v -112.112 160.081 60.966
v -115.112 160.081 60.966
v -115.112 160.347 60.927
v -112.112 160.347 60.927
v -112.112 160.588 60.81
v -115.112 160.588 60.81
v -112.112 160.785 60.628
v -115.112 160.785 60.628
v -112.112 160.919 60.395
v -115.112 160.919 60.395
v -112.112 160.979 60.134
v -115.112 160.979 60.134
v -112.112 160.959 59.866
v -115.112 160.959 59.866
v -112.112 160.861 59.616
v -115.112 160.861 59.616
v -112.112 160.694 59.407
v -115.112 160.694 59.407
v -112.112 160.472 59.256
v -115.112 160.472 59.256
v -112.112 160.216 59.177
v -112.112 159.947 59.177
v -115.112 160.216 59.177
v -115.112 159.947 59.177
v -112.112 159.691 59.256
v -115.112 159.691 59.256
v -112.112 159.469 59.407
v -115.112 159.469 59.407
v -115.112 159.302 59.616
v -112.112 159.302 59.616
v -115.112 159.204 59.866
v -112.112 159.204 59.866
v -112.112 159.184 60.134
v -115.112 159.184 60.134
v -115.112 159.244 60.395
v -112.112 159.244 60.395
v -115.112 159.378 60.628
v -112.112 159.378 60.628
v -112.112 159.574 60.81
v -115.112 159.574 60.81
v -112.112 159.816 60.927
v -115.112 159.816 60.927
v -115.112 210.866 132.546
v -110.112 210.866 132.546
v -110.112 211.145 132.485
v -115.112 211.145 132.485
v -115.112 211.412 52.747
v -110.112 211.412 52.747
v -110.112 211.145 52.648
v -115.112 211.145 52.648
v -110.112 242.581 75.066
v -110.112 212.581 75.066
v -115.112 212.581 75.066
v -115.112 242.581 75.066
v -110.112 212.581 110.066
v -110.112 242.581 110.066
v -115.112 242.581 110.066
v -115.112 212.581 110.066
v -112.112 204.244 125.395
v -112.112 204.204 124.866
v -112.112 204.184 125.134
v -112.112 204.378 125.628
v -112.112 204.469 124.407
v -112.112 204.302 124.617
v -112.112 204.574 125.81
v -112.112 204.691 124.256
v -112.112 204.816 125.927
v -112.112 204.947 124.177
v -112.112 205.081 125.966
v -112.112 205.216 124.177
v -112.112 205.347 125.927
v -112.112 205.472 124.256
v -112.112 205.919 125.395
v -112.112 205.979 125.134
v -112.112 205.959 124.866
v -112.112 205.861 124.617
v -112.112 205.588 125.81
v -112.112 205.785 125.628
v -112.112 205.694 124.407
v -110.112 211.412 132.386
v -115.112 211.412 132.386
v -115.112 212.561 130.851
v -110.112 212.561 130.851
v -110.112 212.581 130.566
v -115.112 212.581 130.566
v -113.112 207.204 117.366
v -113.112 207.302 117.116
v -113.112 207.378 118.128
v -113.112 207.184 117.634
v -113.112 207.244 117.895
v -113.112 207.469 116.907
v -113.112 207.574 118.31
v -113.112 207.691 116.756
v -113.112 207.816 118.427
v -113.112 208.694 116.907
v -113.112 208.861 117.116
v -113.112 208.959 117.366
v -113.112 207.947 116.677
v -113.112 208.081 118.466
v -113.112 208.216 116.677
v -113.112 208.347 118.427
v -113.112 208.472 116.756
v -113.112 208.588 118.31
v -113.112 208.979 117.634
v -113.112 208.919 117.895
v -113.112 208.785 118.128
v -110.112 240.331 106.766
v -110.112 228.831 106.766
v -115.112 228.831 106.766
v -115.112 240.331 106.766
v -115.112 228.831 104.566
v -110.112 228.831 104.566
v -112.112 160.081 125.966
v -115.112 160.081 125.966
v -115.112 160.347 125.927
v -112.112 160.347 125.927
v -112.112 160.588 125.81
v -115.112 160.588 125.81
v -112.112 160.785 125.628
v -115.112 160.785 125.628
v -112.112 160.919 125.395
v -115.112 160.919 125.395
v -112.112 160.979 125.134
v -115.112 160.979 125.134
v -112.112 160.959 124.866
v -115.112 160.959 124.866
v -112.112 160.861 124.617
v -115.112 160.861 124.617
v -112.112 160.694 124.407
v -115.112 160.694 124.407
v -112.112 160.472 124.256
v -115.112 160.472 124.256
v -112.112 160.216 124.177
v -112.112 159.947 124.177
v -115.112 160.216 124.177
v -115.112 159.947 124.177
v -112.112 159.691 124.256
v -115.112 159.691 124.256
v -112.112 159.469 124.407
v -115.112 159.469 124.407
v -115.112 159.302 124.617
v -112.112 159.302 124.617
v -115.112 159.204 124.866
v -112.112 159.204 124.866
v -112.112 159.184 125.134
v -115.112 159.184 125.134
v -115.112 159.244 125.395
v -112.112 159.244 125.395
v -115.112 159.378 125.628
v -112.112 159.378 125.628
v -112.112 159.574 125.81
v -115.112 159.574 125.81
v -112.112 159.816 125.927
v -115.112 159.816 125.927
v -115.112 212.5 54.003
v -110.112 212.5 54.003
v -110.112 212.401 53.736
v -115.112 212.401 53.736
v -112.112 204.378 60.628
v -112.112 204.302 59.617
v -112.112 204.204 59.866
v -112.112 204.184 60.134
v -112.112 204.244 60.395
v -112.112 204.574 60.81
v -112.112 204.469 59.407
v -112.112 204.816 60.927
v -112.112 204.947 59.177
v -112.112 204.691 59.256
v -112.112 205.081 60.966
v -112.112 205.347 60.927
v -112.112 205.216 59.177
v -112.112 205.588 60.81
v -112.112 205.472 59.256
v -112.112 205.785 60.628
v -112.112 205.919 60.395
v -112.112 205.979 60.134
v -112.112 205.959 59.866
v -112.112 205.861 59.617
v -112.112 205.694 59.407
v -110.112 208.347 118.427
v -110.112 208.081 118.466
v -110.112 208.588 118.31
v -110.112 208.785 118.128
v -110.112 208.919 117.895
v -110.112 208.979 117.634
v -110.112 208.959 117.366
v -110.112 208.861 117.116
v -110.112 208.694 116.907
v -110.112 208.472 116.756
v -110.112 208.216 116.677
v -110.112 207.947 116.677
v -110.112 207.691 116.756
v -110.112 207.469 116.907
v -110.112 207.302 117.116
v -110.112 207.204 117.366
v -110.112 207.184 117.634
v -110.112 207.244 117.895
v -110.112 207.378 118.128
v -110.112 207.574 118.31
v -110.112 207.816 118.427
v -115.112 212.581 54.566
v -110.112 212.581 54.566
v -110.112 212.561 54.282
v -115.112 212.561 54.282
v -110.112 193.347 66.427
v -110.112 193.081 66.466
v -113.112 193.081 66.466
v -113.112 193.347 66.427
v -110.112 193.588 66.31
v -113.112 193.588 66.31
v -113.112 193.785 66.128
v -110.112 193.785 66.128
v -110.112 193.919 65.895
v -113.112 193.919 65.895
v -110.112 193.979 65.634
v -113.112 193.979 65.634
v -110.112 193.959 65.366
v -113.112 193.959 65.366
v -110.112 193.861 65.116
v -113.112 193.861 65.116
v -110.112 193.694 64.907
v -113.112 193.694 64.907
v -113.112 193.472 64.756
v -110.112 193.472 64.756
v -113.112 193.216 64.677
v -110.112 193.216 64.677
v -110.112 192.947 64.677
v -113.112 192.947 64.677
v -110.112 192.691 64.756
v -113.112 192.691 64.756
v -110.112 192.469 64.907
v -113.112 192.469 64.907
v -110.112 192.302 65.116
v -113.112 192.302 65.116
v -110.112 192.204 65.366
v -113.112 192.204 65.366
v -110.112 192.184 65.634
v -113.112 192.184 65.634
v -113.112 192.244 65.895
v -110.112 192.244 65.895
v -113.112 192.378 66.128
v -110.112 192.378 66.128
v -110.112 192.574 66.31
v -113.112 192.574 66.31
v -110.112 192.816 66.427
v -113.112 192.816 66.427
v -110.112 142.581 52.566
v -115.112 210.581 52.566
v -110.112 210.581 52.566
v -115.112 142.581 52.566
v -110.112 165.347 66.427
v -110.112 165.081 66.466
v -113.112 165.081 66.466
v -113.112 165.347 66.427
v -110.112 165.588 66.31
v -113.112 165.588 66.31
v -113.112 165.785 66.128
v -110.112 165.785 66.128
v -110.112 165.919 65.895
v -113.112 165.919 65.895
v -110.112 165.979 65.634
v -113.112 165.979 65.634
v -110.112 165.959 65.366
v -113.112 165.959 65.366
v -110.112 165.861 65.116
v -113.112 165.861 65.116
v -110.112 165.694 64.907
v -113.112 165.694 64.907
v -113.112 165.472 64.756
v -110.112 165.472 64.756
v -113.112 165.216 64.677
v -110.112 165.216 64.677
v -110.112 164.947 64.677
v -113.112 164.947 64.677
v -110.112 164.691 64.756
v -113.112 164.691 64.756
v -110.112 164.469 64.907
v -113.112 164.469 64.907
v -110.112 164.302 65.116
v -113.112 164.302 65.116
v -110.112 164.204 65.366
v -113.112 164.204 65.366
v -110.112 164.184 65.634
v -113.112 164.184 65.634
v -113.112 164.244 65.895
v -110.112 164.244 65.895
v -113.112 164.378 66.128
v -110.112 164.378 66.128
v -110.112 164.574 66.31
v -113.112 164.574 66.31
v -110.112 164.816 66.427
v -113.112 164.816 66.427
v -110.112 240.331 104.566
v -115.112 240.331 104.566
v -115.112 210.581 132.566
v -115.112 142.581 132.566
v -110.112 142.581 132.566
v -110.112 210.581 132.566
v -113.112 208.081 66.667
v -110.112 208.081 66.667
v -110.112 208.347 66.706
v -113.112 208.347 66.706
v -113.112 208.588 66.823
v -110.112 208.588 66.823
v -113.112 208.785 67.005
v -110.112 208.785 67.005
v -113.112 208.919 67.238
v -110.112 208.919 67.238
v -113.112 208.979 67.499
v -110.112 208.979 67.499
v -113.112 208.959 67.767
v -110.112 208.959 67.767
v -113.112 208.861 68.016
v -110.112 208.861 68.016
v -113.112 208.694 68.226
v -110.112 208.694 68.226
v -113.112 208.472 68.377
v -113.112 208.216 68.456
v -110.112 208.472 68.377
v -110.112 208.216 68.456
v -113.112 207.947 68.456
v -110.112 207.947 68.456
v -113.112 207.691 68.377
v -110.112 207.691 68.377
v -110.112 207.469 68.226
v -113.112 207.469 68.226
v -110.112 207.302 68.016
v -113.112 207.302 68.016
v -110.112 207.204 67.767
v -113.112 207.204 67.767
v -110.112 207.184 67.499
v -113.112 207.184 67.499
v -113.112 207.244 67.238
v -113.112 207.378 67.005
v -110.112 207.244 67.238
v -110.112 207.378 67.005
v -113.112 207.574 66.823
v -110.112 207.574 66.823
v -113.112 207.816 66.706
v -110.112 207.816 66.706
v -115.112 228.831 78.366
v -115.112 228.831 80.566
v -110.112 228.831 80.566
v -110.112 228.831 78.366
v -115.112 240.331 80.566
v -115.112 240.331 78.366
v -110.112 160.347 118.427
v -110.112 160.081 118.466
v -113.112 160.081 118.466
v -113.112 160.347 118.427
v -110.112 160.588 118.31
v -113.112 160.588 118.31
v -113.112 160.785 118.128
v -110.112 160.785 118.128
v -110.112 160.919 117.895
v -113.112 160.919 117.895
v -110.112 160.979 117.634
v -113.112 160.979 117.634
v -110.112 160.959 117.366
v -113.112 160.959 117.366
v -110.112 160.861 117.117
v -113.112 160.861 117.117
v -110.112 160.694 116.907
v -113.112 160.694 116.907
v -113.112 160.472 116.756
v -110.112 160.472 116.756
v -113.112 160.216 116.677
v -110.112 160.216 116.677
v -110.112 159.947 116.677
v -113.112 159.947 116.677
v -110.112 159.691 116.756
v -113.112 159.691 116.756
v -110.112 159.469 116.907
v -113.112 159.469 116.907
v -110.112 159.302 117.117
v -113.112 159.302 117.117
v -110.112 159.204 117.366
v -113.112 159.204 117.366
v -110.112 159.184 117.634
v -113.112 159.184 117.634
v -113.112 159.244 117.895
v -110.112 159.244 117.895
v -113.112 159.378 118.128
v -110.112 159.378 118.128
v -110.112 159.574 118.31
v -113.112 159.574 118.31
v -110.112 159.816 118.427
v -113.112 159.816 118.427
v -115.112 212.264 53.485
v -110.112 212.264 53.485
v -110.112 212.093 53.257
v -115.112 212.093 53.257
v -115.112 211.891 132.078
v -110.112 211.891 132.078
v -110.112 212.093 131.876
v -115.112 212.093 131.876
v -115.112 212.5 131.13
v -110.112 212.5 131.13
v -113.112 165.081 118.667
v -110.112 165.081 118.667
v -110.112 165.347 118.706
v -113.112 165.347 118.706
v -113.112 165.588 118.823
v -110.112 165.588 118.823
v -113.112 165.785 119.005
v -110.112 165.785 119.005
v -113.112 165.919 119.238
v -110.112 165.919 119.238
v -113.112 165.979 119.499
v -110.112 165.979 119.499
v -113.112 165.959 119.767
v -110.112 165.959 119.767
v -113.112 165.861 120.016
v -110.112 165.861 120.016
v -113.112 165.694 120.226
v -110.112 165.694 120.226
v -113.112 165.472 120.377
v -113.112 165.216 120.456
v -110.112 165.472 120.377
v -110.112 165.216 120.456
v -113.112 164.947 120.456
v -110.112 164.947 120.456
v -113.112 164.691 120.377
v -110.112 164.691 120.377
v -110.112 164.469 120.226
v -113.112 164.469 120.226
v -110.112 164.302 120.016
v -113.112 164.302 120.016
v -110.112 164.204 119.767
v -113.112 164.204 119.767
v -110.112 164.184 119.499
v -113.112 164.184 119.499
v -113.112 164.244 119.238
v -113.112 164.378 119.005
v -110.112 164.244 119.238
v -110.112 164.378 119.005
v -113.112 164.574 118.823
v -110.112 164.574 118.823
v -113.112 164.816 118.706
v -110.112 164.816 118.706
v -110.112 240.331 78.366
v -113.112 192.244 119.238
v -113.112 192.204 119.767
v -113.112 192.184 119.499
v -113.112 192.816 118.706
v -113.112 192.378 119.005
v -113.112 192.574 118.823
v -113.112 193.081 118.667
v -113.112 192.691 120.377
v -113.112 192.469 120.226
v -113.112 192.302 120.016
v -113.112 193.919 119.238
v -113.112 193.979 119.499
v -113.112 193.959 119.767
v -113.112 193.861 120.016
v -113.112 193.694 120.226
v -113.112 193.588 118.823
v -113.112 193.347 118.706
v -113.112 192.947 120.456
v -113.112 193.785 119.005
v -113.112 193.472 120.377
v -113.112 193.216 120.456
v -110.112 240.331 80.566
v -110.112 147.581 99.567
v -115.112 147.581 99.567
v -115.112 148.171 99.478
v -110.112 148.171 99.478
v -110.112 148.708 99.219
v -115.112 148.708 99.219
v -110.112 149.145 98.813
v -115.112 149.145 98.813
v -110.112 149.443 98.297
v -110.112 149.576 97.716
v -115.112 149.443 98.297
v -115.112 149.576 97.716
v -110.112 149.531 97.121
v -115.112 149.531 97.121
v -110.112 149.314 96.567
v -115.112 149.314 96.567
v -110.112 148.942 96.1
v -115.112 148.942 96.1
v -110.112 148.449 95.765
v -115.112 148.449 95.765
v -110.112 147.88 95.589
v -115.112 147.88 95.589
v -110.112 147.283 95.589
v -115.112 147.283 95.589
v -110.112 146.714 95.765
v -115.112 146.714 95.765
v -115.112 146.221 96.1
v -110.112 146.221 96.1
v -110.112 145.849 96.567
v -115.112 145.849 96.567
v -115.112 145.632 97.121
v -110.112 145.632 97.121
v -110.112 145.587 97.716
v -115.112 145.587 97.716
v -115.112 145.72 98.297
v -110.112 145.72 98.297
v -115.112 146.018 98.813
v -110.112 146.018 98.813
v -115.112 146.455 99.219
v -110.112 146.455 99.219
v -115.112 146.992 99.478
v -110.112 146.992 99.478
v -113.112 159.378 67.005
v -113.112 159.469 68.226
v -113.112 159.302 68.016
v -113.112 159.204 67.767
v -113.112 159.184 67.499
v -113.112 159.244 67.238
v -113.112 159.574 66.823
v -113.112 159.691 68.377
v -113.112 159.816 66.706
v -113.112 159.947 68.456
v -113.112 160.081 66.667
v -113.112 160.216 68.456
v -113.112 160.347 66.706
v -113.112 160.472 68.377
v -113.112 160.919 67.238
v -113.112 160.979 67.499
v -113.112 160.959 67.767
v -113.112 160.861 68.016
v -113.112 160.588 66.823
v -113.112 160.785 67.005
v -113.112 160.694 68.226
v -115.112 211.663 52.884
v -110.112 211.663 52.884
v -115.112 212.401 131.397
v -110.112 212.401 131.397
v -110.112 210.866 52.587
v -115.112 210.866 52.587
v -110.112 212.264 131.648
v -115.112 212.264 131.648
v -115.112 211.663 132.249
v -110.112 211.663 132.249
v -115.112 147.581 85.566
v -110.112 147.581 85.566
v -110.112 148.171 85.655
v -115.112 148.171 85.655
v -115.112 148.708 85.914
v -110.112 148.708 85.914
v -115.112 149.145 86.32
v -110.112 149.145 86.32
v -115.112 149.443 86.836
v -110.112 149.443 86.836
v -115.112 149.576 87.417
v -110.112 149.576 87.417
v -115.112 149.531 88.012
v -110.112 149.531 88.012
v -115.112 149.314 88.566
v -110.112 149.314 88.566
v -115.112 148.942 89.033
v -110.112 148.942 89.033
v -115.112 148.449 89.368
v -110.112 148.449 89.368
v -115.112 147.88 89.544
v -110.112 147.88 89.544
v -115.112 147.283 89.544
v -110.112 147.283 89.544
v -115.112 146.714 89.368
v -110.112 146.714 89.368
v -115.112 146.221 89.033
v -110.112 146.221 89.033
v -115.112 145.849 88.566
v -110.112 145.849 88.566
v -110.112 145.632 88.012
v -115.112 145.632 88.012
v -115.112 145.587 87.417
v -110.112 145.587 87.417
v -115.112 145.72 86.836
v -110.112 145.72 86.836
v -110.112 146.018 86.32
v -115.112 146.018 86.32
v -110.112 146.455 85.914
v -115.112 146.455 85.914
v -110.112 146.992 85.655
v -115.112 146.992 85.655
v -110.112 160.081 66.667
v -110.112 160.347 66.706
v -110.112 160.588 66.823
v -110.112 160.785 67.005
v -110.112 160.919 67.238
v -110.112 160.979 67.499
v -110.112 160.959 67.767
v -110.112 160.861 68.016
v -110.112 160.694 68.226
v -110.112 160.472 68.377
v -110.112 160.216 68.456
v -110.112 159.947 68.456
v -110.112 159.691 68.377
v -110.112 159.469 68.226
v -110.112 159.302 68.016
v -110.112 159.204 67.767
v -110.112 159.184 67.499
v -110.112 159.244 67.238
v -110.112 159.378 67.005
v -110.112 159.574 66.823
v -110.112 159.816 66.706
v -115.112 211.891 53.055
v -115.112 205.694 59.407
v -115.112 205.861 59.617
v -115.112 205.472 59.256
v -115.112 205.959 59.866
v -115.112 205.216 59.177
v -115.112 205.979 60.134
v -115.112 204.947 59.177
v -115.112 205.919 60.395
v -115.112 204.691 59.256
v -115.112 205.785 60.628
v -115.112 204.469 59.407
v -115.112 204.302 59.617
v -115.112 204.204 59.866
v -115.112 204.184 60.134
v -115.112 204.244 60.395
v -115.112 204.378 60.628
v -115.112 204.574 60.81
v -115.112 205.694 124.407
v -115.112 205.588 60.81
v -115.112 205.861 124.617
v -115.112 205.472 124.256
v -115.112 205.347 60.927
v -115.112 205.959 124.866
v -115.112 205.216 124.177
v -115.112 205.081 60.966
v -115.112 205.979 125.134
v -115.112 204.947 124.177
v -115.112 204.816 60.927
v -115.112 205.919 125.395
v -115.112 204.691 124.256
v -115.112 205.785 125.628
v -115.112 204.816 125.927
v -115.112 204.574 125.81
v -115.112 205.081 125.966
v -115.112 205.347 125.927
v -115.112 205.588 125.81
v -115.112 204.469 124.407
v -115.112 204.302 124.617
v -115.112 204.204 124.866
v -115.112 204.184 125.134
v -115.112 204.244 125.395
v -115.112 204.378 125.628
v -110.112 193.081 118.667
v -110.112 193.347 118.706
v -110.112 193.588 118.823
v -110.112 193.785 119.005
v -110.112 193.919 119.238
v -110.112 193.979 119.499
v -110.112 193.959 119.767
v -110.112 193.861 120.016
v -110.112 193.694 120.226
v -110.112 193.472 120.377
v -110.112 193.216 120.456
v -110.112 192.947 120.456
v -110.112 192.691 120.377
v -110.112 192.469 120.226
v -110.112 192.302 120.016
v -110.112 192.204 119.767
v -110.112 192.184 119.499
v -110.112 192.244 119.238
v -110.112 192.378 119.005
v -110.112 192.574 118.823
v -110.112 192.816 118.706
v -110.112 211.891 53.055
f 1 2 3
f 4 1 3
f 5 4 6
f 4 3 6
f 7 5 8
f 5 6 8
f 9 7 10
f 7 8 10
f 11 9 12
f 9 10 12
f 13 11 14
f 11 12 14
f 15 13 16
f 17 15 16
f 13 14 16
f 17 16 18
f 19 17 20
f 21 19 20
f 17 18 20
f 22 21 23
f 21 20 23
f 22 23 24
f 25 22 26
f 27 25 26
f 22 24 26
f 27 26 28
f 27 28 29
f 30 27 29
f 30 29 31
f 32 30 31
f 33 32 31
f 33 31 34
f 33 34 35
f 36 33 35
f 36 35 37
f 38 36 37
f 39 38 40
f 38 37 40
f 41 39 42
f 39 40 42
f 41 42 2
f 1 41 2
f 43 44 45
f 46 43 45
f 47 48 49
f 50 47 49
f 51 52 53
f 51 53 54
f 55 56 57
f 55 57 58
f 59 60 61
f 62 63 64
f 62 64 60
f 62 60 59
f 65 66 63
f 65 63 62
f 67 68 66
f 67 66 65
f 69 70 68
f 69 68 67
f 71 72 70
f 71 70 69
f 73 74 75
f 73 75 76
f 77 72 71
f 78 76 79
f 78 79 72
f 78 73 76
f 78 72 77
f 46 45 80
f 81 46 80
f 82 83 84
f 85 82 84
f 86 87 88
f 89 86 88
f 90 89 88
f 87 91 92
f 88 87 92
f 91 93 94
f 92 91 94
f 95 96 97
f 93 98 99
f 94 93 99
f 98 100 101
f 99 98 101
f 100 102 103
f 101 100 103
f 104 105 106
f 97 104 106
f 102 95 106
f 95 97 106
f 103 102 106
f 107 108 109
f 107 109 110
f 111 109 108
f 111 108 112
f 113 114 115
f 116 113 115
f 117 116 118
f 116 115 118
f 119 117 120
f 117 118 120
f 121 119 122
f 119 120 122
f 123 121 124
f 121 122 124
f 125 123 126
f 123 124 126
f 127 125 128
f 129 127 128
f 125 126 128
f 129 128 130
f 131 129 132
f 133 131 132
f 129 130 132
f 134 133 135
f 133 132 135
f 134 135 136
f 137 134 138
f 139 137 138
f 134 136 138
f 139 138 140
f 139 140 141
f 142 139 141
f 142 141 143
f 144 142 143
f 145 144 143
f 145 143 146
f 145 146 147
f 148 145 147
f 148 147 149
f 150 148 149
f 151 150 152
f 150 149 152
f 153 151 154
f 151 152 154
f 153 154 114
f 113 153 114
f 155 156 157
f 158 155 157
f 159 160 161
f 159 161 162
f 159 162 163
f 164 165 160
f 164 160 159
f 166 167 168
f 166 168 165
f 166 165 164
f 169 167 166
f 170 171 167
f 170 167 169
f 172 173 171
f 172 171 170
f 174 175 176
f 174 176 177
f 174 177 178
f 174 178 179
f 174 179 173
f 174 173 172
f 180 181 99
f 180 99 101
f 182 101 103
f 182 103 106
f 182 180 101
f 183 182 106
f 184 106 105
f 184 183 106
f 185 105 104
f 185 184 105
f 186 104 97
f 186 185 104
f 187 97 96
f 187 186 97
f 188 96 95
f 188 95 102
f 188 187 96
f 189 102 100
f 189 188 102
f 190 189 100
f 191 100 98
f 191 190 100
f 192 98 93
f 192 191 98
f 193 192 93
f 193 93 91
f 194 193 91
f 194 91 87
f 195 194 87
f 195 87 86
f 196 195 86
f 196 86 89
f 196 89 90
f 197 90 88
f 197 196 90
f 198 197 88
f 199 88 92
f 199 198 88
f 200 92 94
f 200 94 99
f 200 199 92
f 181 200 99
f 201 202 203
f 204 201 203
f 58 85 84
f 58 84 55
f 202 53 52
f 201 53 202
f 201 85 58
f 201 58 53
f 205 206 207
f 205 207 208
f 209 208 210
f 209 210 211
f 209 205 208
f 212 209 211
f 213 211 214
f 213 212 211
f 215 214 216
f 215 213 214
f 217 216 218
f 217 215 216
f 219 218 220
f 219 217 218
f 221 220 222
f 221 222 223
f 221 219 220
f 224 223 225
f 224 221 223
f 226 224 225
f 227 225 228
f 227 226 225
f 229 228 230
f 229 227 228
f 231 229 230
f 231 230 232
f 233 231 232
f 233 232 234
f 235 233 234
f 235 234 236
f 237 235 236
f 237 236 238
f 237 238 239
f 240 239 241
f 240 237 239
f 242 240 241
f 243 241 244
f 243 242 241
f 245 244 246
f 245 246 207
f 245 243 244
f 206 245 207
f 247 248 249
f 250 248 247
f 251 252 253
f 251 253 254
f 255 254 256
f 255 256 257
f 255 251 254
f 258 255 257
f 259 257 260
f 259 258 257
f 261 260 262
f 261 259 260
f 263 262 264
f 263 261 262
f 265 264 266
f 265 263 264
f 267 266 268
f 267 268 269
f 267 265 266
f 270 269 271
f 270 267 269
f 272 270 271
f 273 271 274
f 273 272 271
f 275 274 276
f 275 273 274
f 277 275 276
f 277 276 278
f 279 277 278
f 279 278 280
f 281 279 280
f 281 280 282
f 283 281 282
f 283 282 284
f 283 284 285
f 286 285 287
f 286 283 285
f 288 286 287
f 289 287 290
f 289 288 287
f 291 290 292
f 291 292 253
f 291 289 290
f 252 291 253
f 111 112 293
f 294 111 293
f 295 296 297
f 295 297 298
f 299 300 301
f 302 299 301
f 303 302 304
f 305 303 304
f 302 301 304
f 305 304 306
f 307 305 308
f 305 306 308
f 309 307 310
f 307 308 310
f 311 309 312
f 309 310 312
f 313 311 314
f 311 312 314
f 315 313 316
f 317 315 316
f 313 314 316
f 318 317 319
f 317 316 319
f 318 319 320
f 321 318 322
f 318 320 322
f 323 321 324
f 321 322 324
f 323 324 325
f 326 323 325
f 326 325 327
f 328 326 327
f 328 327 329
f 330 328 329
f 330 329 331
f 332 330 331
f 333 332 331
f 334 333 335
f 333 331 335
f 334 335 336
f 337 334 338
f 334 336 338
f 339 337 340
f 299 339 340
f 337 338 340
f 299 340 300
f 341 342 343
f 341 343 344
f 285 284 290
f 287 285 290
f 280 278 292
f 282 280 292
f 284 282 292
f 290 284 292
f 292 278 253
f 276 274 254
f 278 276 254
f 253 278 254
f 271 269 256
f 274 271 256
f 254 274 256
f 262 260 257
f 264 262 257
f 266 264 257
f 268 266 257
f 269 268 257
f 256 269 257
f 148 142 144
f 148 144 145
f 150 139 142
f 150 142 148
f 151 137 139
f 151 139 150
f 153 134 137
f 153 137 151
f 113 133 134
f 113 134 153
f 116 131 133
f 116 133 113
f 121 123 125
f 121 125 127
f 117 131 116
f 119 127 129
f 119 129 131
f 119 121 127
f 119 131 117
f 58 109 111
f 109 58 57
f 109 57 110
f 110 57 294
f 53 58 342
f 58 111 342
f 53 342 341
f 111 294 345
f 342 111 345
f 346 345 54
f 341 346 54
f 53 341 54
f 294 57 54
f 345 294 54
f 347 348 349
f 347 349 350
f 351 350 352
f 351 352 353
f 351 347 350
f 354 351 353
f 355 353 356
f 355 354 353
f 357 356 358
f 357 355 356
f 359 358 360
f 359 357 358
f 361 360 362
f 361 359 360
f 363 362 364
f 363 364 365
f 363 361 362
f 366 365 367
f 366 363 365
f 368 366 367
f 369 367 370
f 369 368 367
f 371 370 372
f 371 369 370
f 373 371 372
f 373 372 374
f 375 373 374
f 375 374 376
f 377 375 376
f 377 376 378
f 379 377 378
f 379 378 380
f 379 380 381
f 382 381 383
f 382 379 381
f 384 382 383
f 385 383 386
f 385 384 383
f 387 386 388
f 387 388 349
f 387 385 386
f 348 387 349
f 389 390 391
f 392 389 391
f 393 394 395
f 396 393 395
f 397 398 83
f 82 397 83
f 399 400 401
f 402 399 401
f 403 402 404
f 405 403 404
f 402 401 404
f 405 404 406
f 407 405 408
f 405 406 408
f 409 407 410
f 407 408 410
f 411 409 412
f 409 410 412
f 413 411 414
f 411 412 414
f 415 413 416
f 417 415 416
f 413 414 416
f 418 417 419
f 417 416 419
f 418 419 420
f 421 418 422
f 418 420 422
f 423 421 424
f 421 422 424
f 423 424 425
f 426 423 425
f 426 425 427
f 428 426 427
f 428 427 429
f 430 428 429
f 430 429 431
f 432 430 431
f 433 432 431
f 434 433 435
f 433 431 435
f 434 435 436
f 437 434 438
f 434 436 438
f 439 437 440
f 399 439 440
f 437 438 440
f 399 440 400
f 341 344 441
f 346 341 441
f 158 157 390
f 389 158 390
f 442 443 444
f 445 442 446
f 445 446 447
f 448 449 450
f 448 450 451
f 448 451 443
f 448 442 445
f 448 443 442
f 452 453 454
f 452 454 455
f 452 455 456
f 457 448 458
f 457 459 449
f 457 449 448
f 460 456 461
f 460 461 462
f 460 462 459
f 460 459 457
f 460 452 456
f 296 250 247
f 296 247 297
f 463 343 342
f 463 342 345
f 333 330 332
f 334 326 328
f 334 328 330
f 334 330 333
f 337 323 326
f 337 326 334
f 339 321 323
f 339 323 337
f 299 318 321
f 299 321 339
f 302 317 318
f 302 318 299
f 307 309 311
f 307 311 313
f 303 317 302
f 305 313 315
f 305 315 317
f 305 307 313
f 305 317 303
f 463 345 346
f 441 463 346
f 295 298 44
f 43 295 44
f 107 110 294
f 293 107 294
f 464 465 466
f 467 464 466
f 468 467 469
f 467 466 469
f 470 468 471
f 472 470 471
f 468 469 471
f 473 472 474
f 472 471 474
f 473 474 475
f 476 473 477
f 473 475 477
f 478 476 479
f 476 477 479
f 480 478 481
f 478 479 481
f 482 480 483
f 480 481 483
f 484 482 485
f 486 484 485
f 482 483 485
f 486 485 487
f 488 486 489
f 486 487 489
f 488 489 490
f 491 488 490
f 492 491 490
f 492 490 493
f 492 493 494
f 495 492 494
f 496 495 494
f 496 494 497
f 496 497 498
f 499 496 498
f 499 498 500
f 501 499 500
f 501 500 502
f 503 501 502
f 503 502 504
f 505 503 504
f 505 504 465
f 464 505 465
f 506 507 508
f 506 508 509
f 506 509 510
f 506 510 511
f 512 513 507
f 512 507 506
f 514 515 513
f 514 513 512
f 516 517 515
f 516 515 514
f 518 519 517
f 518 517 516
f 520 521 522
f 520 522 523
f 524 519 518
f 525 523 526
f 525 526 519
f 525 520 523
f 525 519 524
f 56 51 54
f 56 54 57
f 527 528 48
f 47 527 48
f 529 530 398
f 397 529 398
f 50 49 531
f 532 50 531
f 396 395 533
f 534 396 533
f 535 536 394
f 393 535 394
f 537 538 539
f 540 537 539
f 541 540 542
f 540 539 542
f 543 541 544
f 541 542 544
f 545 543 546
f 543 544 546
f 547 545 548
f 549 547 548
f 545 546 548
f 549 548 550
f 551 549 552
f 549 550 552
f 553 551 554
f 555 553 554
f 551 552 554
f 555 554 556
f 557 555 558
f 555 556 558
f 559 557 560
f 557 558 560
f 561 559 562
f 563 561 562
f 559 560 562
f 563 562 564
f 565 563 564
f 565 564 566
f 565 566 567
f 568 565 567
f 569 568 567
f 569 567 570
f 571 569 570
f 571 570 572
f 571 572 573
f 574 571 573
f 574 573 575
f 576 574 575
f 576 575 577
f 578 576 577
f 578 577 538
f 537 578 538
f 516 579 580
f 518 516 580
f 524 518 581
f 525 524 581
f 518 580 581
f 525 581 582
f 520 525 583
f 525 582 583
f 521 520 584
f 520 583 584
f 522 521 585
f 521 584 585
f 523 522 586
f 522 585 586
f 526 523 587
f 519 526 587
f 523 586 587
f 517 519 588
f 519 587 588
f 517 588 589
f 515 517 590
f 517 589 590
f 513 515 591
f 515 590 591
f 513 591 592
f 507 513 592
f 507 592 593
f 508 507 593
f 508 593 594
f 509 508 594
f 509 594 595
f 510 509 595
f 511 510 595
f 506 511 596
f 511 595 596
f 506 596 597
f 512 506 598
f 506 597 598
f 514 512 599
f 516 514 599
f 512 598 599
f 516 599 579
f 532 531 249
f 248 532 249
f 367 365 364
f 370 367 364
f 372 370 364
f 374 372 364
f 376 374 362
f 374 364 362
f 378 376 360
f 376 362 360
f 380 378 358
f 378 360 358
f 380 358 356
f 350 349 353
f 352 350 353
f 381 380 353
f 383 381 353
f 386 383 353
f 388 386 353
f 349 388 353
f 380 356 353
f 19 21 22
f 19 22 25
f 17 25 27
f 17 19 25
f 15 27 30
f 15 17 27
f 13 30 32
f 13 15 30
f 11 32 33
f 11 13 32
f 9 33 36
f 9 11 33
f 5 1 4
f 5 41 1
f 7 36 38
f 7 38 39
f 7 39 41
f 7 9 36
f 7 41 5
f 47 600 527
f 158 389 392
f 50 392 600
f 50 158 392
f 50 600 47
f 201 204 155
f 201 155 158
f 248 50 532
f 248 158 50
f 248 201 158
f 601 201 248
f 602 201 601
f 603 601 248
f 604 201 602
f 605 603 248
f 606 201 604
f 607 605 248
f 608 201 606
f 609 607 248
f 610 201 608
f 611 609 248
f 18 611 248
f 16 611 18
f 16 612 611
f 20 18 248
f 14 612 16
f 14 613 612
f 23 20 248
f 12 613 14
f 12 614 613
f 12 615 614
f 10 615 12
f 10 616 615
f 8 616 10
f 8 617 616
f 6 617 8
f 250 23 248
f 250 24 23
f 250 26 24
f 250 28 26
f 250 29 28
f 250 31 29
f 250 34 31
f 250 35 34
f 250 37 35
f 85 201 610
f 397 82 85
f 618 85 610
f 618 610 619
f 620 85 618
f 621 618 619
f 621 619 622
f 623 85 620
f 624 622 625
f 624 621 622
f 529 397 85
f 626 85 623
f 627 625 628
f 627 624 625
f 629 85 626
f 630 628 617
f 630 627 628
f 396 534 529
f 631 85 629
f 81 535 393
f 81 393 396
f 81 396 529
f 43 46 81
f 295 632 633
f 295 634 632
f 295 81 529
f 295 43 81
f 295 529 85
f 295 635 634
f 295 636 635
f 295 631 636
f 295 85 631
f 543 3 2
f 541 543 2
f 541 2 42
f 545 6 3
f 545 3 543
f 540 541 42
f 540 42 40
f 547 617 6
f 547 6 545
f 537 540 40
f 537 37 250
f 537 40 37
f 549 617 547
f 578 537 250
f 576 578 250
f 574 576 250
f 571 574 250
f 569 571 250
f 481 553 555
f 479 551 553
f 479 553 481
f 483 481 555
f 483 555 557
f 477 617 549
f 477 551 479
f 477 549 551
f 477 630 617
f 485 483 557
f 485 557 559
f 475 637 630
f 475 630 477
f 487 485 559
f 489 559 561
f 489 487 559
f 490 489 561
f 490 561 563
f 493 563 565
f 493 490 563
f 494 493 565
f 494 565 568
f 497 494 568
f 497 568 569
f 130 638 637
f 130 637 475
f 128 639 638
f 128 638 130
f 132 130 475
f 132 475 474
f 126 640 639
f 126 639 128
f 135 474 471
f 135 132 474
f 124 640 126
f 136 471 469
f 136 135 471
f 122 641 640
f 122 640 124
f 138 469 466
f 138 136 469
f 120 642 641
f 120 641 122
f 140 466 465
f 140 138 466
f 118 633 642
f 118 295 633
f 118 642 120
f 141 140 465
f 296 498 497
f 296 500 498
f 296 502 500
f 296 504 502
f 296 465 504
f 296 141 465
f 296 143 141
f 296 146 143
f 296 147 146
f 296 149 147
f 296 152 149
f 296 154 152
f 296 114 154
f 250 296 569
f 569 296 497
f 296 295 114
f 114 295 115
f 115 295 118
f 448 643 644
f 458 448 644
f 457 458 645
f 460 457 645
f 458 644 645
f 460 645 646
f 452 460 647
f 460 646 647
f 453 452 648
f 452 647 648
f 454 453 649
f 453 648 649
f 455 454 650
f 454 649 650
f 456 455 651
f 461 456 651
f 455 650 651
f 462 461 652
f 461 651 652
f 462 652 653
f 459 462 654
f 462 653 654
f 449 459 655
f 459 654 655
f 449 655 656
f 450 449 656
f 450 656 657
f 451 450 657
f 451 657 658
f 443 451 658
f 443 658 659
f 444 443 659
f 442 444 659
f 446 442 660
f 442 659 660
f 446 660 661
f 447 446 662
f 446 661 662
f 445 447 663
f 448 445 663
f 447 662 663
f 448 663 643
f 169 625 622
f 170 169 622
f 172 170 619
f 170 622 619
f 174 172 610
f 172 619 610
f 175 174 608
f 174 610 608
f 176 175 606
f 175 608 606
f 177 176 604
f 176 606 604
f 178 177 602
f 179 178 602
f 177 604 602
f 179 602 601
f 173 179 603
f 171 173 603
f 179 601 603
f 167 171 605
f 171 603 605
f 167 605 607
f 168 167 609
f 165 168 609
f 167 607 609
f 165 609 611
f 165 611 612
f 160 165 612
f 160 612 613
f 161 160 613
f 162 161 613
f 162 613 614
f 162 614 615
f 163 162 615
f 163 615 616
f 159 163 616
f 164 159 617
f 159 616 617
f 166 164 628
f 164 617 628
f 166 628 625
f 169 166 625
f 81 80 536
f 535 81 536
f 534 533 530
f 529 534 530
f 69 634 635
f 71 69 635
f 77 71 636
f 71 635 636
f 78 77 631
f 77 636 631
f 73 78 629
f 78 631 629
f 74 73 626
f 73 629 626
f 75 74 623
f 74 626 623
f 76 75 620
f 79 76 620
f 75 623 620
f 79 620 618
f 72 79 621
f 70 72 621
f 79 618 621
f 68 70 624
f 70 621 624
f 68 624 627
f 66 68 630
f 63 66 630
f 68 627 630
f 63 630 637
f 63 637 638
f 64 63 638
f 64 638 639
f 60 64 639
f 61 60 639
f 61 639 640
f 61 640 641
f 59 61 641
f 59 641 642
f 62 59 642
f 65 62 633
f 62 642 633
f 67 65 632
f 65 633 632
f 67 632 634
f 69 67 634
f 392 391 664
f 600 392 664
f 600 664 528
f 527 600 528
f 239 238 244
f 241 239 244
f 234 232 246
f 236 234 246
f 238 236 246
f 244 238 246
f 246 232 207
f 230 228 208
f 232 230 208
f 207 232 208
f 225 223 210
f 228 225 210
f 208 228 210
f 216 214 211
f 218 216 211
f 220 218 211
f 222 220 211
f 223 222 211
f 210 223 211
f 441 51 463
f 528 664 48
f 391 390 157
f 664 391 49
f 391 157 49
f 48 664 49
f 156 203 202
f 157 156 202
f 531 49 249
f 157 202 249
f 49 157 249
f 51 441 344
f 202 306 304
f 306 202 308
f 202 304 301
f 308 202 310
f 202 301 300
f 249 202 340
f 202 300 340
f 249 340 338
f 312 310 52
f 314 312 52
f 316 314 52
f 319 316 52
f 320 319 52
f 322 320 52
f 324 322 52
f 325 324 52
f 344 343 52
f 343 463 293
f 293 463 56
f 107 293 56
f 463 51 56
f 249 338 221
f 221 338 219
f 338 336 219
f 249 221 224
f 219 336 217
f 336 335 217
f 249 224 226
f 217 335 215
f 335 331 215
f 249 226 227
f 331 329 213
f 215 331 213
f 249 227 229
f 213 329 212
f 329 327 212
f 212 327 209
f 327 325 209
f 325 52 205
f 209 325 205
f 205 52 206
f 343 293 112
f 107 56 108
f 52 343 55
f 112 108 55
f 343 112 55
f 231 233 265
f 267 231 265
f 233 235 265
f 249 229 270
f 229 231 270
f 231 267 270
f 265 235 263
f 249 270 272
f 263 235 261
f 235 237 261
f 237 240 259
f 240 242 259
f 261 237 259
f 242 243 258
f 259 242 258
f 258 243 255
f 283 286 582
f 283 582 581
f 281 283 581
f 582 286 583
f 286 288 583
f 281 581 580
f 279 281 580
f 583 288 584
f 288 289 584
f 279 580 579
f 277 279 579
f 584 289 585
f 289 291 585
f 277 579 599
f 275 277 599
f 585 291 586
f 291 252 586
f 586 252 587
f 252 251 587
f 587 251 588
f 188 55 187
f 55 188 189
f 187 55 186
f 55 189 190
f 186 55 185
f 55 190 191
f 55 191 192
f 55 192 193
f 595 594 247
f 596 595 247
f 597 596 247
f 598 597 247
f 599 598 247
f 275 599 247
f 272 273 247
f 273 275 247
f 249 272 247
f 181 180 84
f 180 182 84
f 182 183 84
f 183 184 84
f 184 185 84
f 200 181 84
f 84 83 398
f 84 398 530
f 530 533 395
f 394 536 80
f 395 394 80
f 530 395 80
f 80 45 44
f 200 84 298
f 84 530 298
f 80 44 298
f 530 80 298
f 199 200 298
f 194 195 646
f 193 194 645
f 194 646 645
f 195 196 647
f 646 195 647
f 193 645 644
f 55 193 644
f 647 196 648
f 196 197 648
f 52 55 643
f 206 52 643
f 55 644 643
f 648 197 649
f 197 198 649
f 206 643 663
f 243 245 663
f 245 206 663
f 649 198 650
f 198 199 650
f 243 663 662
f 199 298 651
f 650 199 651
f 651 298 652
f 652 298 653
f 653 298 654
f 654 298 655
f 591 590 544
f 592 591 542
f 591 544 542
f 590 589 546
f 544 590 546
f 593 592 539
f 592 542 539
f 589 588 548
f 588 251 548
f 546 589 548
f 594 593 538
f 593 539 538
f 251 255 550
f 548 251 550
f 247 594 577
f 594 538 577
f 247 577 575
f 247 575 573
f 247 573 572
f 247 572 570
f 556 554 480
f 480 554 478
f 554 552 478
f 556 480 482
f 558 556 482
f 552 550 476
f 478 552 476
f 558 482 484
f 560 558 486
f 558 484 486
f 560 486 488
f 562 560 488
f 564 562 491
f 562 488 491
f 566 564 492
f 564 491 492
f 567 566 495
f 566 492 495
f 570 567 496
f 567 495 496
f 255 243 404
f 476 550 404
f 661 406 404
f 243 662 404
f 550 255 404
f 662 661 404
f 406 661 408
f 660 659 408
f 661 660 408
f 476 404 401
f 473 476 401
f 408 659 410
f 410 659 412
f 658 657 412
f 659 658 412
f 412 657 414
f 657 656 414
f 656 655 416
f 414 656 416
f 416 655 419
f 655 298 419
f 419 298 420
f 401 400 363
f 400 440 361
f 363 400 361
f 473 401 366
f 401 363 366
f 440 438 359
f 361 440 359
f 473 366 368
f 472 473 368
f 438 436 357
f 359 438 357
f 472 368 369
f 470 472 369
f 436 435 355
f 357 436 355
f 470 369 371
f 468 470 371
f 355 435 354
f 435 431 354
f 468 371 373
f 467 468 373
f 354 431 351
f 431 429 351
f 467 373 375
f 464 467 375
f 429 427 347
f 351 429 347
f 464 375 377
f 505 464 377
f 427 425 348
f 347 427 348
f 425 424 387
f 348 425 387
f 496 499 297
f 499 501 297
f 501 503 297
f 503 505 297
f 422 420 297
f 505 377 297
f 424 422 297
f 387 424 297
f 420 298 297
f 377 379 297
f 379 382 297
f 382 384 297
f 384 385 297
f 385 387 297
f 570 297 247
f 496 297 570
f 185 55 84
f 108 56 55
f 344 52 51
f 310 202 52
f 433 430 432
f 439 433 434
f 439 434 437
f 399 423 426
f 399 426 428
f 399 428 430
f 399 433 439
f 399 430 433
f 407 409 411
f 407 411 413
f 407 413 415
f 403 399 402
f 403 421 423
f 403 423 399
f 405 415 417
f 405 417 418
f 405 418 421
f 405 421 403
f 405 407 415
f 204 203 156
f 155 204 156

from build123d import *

# Parameters (mm, degrees)
BOSS_EXTRUDE1_DEPTH = 5.000002682
SKETCH2_R           = 2.000000134
CUT_EXTRUDE1_DEPTH  = 251.578832691
SKETCH3_R           = 2.000006516
CUT_EXTRUDE2_DEPTH  = 251.578832691
SKETCH4_R           = 0.899997723
CUT_EXTRUDE3_DEPTH  = 2.999998629
SKETCH5_R           = 0.899983627
CUT_EXTRUDE4_DEPTH  = 3.00000608
SKETCH6_R           = 0.900000334
CUT_EXTRUDE5_DEPTH  = 3.00000608
SKETCH7_R           = 0.899990272
CUT_EXTRUDE6_DEPTH  = 2.999998629
SKETCH8_R           = 0.899993205
CUT_EXTRUDE7_DEPTH  = 3.00000608
SKETCH9_R           = 0.899993205
CUT_EXTRUDE8_DEPTH  = 3.00000608
SKETCH10_R          = 0.899997723
CUT_EXTRUDE9_DEPTH  = 2.999998629
SKETCH11_R          = 0.899993205
CUT_EXTRUDE10_DEPTH = 2.999998629
SKETCH12_W          = 2.2
SKETCH12_H          = 11.5
BOSS_EXTRUDE2_DEPTH = 5


with BuildPart() as part:
    # Sketch1 → Boss-Extrude1 (new body)
    with BuildSketch(Plane(origin=(-115.112178028, 0, 0), x_dir=(0, -1, 0), z_dir=(-1, 0, 0))):
        Polygon((-142.581447959, 52.566498518), (-142.581447959, 132.56649673), (-210.581451654, 132.56649673), (-210.866093636, 132.546141744), (-211.144909263, 132.485494018), (-211.412280798, 132.385760546), (-211.662739515, 132.249012589), (-211.891174316, 132.078006864), (-212.09295094, 131.876215339), (-212.263956666, 131.647780538), (-212.400704622, 131.39732182), (-212.500438094, 131.129965186), (-212.561100721, 130.851134658), (-212.581455708, 130.566492677), (-212.581455708, 54.566498846), (-212.561100721, 54.281868041), (-212.500438094, 54.003033787), (-212.400704622, 53.735669702), (-212.263956666, 53.485218436), (-212.09295094, 53.256779909), (-211.891174316, 53.05499956), (-211.662739515, 52.883990109), (-211.412280798, 52.747234702), (-211.144909263, 52.647516131), (-210.866093636, 52.586857229), (-210.581451654, 52.566498518), align=None)
    extrude(amount=-BOSS_EXTRUDE1_DEPTH)

    # Sketch2 → Cut-Extrude1 (cut, through all)
    with BuildSketch(Plane.ZY.offset(115.112178028)):
        with Locations((97.566500306, 147.581450641)):
            Circle(SKETCH2_R)
    extrude(amount=-CUT_EXTRUDE1_DEPTH, mode=Mode.SUBTRACT)

    # Sketch3 → Cut-Extrude2 (cut, through all)
    with BuildSketch(Plane(origin=(-110.112175345, 0, 0), x_dir=(0, 0, -1), z_dir=(1, 0, 0))):
        with Locations((-87.566494942, 147.581450641)):
            Circle(SKETCH3_R)
    extrude(amount=-CUT_EXTRUDE2_DEPTH, mode=Mode.SUBTRACT)

    # Sketch4 → Cut-Extrude3 (cut)
    with BuildSketch(Plane(origin=(-110.112175345, 0, 0), x_dir=(0, 0, -1), z_dir=(1, 0, 0))):
        with Locations((-119.566500187, 165.081456304)):
            Circle(SKETCH4_R)
    cut_extrude3 = extrude(amount=-CUT_EXTRUDE3_DEPTH, mode=Mode.SUBTRACT)

    # Sketch5 → Cut-Extrude4 (cut)
    with BuildSketch(Plane.ZY.offset(115.112178028)):
        with Locations((125.066503882, 160.081461072)):
            Circle(SKETCH5_R)
    extrude(amount=-CUT_EXTRUDE4_DEPTH, mode=Mode.SUBTRACT)

    # Sketch6 → Cut-Extrude5 (cut)
    with BuildSketch(Plane.ZY.offset(115.112178028)):
        with Locations((60.066498816, 160.081461072)):
            Circle(SKETCH6_R)
    extrude(amount=-CUT_EXTRUDE5_DEPTH, mode=Mode.SUBTRACT)

    # Sketch7 → Cut-Extrude6 (cut)
    with BuildSketch(Plane(origin=(-110.112175345, 0, 0), x_dir=(0, 0, -1), z_dir=(1, 0, 0))):
        with Locations((-67.566499114, 160.081461072)):
            Circle(SKETCH7_R)
    cut_extrude6 = extrude(amount=-CUT_EXTRUDE6_DEPTH, mode=Mode.SUBTRACT)

    # Sketch8 → Cut-Extrude7 (cut)
    with BuildSketch(Plane.ZY.offset(115.112178028)):
        with Locations((125.066503882, 205.08146286)):
            Circle(SKETCH8_R)
    extrude(amount=-CUT_EXTRUDE7_DEPTH, mode=Mode.SUBTRACT)

    # Sketch9 → Cut-Extrude8 (cut)
    with BuildSketch(Plane.ZY.offset(115.112178028)):
        with Locations((60.066498816, 205.08146286)):
            Circle(SKETCH9_R)
    extrude(amount=-CUT_EXTRUDE8_DEPTH, mode=Mode.SUBTRACT)

    # Sketch10 → Cut-Extrude9 (cut)
    with BuildSketch(Plane(origin=(-110.112175345, 0, 0), x_dir=(0, 0, -1), z_dir=(1, 0, 0))):
        with Locations((-119.566500187, 193.081453443)):
            Circle(SKETCH10_R)
    cut_extrude9 = extrude(amount=-CUT_EXTRUDE9_DEPTH, mode=Mode.SUBTRACT)

    # Sketch11 → Cut-Extrude10 (cut)
    with BuildSketch(Plane(origin=(-110.112175345, 0, 0), x_dir=(0, 0, -1), z_dir=(1, 0, 0))):
        with Locations((-67.566499114, 208.081454039)):
            Circle(SKETCH11_R)
    cut_extrude10 = extrude(amount=-CUT_EXTRUDE10_DEPTH, mode=Mode.SUBTRACT)

    # Sketch12 → Boss-Extrude2 (add)
    with BuildSketch(Plane(origin=(-110.112175345, 0, 0), x_dir=(0, 0, -1), z_dir=(1, 0, 0))):
        Polygon((-110.066497624, 226.581455708), (-110.066497624, 212.581455708), (-75.066497624, 212.581455708), (-75.066497624, 226.581455708), (-75.066497624, 242.581455708), (-110.066497624, 242.581455708), align=None)
        with Locations((-105.666497624, 234.581455708)):
            Rectangle(SKETCH12_W, SKETCH12_H, mode=Mode.SUBTRACT)
        with Locations((-79.466497624, 234.581455708)):
            Rectangle(SKETCH12_W, SKETCH12_H, mode=Mode.SUBTRACT)
    extrude(amount=-BOSS_EXTRUDE2_DEPTH)

    # Mirror1: Cut-Extrude3, Cut-Extrude6, Cut-Extrude9, Cut-Extrude10 across plane
    add(cut_extrude3.mirror(Plane.XY.offset(92.566497624)), mode=Mode.SUBTRACT)
    add(cut_extrude6.mirror(Plane.XY.offset(92.566497624)), mode=Mode.SUBTRACT)
    add(cut_extrude9.mirror(Plane.XY.offset(92.566497624)), mode=Mode.SUBTRACT)
    add(cut_extrude10.mirror(Plane.XY.offset(92.566497624)), mode=Mode.SUBTRACT)


solid = part.part
